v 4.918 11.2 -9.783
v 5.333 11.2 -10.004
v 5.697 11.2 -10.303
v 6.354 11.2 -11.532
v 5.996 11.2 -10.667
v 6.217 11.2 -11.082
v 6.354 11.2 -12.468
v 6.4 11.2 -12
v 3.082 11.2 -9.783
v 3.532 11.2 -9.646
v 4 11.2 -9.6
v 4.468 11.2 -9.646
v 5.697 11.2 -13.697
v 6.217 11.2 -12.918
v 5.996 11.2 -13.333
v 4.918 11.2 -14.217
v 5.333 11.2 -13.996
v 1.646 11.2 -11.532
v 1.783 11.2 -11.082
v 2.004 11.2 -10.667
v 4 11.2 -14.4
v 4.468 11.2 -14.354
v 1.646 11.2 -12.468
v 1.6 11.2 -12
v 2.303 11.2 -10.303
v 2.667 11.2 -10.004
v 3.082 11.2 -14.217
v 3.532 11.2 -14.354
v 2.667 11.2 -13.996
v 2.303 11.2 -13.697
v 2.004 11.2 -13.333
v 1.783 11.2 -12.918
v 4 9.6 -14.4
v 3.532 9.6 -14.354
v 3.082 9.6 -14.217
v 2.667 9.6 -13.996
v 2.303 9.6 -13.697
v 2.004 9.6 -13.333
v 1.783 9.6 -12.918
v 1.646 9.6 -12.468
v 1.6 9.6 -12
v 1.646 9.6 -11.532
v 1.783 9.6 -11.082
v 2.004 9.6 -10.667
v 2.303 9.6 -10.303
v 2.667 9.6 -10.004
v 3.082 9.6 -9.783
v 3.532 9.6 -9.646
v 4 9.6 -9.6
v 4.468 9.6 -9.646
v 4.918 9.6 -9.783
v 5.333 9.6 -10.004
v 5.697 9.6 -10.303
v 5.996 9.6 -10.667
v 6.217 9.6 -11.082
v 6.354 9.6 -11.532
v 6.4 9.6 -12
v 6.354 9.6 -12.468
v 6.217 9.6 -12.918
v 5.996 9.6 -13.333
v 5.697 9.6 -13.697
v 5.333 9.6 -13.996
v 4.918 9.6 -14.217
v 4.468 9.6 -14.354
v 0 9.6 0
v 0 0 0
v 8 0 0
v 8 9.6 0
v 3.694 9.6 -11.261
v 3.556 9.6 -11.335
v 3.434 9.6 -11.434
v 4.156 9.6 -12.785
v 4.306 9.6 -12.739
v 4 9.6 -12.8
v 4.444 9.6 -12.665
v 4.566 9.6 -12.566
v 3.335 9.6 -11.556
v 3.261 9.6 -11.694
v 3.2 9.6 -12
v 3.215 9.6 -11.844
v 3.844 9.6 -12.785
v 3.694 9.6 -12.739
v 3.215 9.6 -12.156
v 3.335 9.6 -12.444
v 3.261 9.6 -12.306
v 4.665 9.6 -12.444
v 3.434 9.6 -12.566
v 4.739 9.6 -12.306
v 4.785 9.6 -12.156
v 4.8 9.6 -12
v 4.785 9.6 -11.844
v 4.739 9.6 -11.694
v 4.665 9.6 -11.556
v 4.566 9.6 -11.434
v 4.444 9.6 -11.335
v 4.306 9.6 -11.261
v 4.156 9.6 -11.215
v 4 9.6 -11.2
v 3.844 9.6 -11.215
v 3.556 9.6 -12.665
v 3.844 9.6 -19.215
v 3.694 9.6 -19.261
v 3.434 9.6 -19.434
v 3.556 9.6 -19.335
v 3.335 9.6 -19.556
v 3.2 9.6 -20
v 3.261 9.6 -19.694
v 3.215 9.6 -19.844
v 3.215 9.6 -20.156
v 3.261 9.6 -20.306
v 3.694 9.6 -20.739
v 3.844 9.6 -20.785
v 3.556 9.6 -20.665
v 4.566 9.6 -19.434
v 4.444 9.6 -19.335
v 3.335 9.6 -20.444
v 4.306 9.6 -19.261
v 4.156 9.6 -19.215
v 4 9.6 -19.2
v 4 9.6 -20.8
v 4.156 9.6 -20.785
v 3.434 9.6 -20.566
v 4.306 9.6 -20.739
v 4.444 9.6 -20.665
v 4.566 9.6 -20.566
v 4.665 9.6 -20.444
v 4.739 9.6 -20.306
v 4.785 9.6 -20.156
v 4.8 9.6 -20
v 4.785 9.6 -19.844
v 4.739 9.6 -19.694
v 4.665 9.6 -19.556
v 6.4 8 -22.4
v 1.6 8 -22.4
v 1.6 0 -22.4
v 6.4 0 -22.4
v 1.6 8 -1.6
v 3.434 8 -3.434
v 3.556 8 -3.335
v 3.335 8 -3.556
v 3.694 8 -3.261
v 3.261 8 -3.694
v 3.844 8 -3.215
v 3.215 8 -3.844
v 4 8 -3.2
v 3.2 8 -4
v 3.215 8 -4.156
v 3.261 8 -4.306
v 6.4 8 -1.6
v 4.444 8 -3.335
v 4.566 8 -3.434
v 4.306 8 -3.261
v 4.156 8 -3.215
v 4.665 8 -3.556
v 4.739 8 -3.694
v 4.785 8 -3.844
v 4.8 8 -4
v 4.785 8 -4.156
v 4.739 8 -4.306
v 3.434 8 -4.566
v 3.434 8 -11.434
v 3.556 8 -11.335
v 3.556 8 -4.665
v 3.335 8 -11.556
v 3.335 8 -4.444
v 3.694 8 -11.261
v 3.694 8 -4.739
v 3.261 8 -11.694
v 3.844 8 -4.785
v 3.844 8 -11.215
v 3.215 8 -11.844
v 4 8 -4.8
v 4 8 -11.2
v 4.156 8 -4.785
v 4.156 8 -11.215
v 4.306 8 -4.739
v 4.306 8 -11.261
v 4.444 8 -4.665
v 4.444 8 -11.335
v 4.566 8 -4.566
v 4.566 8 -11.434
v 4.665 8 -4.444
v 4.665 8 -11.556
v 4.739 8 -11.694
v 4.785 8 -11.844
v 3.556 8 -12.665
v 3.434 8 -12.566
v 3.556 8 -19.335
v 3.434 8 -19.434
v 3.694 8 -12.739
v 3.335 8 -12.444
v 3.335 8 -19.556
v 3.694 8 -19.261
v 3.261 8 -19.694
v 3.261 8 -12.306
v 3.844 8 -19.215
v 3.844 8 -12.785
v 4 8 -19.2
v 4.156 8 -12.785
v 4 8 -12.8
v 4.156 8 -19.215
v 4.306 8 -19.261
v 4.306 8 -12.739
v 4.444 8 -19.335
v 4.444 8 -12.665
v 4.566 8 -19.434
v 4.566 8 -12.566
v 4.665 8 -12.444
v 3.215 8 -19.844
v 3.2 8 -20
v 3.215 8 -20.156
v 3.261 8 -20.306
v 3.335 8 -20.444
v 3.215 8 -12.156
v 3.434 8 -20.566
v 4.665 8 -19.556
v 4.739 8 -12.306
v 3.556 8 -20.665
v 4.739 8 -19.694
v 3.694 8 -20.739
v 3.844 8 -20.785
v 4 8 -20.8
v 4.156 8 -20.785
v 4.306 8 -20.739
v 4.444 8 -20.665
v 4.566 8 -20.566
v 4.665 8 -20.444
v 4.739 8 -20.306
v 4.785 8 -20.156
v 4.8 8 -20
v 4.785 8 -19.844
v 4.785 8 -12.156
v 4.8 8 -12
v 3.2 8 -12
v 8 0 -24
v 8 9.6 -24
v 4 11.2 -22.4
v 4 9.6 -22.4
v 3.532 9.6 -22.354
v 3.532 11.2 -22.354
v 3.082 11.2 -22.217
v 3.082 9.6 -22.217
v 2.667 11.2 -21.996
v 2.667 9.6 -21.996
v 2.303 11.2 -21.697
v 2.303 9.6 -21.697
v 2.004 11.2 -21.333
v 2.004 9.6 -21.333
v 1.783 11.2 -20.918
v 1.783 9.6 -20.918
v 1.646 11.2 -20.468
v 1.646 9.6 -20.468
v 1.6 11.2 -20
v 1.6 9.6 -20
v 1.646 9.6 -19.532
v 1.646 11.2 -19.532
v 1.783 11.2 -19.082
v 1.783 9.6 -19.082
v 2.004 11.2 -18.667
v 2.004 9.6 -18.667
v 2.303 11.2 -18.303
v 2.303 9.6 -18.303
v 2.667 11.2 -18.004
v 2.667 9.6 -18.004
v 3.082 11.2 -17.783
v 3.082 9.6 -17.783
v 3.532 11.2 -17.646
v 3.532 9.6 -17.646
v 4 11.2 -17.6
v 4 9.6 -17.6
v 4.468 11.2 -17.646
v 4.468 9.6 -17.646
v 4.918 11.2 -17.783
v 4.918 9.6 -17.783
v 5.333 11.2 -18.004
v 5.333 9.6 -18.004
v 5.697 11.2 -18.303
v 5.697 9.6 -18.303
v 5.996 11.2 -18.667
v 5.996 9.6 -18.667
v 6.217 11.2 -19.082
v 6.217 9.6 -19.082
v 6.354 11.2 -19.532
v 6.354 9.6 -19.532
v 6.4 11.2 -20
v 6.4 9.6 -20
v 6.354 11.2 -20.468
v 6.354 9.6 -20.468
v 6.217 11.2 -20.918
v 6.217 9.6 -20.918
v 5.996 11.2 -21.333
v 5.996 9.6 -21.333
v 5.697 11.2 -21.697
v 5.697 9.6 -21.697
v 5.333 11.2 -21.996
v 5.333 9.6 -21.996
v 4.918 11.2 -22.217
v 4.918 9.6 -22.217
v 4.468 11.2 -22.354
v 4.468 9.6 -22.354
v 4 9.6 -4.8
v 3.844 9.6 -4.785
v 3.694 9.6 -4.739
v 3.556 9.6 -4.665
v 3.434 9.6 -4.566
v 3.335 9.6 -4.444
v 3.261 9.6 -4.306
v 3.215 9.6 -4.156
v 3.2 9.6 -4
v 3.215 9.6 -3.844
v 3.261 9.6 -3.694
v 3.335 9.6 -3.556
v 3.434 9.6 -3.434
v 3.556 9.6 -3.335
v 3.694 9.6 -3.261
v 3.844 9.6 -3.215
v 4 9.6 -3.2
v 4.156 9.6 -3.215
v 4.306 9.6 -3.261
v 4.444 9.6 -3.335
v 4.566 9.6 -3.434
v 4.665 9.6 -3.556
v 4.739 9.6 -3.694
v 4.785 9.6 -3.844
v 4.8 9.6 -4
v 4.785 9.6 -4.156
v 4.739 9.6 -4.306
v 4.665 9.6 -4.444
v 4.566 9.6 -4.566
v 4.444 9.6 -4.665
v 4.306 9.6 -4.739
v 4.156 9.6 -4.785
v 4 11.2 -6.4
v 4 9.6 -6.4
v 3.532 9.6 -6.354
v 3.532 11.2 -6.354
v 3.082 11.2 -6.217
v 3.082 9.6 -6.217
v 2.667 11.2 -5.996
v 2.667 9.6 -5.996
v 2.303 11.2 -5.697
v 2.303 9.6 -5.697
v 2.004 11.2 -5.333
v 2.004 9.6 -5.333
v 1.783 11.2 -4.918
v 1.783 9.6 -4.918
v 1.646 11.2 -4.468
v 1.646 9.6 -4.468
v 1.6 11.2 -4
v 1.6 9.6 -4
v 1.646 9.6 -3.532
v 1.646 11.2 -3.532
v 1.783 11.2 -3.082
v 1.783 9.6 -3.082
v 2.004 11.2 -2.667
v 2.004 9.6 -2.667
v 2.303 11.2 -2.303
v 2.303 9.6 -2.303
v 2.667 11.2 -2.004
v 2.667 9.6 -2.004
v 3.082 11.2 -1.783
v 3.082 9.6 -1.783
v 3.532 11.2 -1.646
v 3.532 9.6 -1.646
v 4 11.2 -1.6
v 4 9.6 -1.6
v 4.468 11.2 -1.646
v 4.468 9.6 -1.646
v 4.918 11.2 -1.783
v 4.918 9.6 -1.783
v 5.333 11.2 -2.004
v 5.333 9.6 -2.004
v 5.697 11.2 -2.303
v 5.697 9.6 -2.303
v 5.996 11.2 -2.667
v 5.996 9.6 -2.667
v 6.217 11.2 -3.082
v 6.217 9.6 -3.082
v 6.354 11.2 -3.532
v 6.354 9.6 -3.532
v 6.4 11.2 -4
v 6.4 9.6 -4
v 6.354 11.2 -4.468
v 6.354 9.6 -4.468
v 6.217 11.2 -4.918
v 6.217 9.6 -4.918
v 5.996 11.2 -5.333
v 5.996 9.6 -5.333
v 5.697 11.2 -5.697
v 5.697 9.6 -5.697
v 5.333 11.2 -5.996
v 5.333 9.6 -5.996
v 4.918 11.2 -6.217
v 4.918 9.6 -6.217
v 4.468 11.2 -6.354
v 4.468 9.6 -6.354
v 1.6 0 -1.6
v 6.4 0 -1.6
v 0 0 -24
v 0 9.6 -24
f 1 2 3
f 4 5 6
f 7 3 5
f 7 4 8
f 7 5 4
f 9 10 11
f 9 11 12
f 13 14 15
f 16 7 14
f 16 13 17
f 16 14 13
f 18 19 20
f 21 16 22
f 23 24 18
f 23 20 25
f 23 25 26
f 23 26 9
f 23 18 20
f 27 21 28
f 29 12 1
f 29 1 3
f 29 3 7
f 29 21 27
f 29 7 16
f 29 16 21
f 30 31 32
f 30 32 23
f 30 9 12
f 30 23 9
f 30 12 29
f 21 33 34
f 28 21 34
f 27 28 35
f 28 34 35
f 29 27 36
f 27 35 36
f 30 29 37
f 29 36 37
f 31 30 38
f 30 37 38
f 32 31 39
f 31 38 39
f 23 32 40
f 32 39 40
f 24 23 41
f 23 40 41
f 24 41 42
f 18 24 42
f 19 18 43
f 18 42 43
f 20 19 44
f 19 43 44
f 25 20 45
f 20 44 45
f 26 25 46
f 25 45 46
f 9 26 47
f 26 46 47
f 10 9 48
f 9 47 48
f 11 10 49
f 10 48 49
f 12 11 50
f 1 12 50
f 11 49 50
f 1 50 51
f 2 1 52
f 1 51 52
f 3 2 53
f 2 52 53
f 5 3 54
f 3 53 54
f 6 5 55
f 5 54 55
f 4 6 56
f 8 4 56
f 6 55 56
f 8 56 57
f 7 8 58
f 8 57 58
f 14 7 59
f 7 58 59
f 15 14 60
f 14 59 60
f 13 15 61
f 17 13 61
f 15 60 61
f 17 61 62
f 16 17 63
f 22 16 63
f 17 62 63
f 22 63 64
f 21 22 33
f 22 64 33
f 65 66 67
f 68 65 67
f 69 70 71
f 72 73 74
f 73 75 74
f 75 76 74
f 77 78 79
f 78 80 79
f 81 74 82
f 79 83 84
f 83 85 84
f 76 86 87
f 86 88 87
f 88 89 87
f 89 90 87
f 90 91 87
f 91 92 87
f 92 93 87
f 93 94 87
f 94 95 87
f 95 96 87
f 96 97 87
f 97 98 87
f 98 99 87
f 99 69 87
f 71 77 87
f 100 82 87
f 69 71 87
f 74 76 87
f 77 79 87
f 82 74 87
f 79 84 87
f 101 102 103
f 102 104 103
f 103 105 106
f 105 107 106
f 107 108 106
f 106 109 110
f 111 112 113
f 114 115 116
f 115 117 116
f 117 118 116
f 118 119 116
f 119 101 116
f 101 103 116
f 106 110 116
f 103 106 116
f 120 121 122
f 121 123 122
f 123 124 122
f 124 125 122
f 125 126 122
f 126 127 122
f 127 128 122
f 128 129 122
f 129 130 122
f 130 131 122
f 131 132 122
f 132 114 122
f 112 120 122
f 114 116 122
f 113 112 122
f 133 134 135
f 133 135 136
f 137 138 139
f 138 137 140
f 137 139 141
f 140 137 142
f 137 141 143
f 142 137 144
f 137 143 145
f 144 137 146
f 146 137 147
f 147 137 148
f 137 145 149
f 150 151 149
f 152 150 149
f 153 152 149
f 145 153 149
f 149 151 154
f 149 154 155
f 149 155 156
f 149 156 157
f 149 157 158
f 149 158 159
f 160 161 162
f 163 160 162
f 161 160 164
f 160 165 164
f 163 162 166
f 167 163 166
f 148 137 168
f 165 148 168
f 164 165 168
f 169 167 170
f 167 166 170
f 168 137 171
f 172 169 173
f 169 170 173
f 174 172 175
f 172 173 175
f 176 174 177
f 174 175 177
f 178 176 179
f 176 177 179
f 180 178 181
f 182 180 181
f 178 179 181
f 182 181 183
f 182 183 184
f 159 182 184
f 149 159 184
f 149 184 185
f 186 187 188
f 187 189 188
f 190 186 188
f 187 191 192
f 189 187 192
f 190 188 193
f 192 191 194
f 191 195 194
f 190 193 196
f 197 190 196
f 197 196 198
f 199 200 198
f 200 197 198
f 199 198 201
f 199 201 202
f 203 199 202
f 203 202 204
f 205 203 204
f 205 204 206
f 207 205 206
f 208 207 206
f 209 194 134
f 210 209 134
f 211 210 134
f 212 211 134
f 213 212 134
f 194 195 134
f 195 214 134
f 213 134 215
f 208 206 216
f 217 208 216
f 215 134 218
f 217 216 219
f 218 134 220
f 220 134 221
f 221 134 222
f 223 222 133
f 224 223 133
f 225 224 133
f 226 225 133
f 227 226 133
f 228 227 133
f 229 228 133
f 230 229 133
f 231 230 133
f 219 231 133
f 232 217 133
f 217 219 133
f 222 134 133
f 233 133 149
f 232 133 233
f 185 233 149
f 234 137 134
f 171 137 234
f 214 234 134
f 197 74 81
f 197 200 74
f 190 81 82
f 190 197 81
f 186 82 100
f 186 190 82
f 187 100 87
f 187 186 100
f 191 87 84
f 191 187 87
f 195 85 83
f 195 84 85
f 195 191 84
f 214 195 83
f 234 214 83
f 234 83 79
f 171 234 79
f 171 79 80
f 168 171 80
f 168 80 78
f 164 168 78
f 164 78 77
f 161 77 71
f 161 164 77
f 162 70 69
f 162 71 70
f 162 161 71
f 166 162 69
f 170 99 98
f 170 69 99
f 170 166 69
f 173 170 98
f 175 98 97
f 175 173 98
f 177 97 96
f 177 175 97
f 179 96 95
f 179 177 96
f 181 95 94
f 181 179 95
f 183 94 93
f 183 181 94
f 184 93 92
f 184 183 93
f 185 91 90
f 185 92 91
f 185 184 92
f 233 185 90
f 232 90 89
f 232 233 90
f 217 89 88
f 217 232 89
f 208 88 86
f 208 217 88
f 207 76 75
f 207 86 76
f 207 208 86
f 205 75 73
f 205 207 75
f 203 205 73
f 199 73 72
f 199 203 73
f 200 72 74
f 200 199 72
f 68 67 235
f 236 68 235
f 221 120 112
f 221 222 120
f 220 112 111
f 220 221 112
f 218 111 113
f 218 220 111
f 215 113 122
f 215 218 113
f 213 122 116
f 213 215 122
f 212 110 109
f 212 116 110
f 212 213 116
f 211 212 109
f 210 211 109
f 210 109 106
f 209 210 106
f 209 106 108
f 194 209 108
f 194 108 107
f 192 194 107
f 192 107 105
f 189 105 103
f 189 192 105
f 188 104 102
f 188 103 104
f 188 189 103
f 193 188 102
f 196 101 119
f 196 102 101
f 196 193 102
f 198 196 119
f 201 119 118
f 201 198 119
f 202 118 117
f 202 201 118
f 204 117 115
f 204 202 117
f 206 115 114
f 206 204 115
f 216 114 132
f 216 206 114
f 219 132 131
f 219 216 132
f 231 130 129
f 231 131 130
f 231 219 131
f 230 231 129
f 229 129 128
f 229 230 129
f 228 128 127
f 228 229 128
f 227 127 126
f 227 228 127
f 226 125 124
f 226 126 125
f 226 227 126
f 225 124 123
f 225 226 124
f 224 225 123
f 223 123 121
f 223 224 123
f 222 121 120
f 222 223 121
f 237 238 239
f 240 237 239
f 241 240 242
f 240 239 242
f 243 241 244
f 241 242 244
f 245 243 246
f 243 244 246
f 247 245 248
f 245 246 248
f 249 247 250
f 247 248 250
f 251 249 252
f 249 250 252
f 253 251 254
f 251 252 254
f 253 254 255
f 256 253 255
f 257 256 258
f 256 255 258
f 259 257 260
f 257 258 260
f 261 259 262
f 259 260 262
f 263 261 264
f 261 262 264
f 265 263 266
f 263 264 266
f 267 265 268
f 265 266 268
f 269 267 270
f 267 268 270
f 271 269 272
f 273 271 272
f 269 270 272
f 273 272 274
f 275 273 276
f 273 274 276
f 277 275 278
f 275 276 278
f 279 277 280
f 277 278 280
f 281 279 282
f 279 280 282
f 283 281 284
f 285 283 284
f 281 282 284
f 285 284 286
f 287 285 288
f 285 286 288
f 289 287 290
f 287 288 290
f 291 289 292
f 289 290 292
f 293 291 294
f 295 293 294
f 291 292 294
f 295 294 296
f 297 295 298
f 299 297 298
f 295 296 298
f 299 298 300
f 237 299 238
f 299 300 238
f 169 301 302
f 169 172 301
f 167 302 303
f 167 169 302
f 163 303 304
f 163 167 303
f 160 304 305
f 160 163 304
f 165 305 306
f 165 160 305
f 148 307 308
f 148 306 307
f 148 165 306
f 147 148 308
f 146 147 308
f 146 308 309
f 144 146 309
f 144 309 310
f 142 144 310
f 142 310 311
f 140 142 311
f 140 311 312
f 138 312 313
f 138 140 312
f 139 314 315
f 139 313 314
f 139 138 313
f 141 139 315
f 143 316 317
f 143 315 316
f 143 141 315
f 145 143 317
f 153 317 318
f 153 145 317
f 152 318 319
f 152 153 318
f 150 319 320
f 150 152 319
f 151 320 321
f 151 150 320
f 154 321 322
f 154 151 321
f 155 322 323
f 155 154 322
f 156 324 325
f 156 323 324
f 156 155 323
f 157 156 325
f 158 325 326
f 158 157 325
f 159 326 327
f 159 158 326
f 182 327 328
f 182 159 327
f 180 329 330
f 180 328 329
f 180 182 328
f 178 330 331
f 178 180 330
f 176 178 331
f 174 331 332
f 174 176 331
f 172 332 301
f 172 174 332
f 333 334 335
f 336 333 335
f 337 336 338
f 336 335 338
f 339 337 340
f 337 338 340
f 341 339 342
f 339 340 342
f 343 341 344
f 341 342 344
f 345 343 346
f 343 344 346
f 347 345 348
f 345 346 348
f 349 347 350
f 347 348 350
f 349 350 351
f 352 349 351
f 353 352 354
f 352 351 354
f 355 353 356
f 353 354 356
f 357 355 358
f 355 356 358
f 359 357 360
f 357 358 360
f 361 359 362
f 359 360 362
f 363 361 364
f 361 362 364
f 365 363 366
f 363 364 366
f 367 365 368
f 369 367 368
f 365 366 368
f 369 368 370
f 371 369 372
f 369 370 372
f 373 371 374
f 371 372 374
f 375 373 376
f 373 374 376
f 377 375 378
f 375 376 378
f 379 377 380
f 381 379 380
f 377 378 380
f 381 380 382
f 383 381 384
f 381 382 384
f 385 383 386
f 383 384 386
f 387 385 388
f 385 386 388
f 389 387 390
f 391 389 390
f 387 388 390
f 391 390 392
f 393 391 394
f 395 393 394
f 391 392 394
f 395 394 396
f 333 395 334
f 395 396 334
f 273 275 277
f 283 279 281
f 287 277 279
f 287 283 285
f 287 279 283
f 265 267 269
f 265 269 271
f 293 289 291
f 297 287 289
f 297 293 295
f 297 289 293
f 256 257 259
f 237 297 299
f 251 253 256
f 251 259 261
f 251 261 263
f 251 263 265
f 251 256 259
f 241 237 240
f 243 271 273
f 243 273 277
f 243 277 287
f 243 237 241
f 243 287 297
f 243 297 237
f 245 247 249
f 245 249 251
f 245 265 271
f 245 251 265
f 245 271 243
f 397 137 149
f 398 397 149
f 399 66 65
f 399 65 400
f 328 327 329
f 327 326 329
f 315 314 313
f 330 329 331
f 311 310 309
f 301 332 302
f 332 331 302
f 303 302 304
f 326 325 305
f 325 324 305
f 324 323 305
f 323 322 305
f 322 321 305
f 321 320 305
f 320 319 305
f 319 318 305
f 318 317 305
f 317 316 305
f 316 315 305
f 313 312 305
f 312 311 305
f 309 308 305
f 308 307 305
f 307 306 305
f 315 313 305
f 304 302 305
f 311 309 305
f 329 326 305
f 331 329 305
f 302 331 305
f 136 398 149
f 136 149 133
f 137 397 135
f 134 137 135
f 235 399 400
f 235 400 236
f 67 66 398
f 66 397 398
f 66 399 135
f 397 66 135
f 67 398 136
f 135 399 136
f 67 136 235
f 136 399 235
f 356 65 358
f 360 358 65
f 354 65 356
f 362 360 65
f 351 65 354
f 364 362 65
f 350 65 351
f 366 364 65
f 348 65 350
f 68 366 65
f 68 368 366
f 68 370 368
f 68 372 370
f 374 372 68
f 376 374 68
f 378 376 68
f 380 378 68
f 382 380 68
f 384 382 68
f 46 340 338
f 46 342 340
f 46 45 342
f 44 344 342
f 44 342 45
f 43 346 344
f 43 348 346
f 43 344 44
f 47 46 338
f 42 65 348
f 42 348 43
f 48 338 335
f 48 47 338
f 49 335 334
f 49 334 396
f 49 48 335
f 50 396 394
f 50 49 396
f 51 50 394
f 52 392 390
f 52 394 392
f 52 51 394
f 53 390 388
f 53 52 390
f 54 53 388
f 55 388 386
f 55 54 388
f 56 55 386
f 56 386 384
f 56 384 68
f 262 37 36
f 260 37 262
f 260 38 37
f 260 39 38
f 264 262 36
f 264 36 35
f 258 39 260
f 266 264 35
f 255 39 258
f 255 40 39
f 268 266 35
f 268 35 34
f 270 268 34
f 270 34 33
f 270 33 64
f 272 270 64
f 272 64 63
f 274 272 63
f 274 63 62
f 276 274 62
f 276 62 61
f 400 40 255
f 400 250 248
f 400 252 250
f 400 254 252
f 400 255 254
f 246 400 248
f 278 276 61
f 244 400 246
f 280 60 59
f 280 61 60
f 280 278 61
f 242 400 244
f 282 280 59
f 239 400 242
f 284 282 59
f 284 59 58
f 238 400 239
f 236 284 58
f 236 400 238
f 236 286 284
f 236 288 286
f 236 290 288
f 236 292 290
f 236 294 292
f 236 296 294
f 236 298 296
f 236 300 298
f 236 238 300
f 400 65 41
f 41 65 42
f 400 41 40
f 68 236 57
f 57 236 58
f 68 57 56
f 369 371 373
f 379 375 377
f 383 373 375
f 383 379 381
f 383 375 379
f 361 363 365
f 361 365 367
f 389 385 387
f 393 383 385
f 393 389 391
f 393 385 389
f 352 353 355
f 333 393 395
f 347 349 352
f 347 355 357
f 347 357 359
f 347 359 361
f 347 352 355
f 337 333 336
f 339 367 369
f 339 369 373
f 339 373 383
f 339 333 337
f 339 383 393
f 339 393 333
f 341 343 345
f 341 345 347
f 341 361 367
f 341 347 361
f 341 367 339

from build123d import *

# Parameters (mm, degrees)
SKETCH1_W            = 8
SKETCH1_H            = 24
BOSS_EXTRUDE1_DEPTH  = 9.6
SKETCH2_R            = 2.4
BOSS_EXTRUDE2_DEPTH  = 1.6
LPATTERN1_COUNT      = 2
LPATTERN1_PITCH      = 8
LPATTERN1_COUNT_DIR2 = 4
LPATTERN1_PITCH_DIR2 = 8
SHELL1_T             = -1.6


with BuildPart() as part:
    # Sketch1 → Boss-Extrude1 (new body)
    with BuildSketch(Plane(origin=(0, 0, 0), x_dir=(1, 0, 0), z_dir=(0, 1, 0))):
        with Locations((4, 12)):
            Rectangle(SKETCH1_W, SKETCH1_H)
    extrude(amount=BOSS_EXTRUDE1_DEPTH)

    # Sketch2 → Boss-Extrude2 (add)
    with BuildSketch(Plane(origin=(0, 9.6, 0), x_dir=(1, 0, 0), z_dir=(0, 1, 0))):
        with Locations(Location((4, 4, 0), (0, 0, 90))):
            Circle(SKETCH2_R)
    boss_extrude2 = extrude(amount=BOSS_EXTRUDE2_DEPTH)

    # LPattern1: Boss-Extrude2 2 × 4, 5 skipped
    with Locations(*[(i * LPATTERN1_PITCH, 0, -j * LPATTERN1_PITCH_DIR2) for i in range(LPATTERN1_COUNT) for j in range(LPATTERN1_COUNT_DIR2) if (i, j) not in ((0, 0), (0, 3), (1, 0), (1, 1), (1, 2), (1, 3))]):
        add(boss_extrude2)

    # Shell1
    shell1_openings = [part.faces().sort_by_distance(p)[0] for p in [
        (4, 0, -12),
    ]]
    offset(amount=SHELL1_T, openings=shell1_openings, kind=Kind.INTERSECTION)


solid = part.part
